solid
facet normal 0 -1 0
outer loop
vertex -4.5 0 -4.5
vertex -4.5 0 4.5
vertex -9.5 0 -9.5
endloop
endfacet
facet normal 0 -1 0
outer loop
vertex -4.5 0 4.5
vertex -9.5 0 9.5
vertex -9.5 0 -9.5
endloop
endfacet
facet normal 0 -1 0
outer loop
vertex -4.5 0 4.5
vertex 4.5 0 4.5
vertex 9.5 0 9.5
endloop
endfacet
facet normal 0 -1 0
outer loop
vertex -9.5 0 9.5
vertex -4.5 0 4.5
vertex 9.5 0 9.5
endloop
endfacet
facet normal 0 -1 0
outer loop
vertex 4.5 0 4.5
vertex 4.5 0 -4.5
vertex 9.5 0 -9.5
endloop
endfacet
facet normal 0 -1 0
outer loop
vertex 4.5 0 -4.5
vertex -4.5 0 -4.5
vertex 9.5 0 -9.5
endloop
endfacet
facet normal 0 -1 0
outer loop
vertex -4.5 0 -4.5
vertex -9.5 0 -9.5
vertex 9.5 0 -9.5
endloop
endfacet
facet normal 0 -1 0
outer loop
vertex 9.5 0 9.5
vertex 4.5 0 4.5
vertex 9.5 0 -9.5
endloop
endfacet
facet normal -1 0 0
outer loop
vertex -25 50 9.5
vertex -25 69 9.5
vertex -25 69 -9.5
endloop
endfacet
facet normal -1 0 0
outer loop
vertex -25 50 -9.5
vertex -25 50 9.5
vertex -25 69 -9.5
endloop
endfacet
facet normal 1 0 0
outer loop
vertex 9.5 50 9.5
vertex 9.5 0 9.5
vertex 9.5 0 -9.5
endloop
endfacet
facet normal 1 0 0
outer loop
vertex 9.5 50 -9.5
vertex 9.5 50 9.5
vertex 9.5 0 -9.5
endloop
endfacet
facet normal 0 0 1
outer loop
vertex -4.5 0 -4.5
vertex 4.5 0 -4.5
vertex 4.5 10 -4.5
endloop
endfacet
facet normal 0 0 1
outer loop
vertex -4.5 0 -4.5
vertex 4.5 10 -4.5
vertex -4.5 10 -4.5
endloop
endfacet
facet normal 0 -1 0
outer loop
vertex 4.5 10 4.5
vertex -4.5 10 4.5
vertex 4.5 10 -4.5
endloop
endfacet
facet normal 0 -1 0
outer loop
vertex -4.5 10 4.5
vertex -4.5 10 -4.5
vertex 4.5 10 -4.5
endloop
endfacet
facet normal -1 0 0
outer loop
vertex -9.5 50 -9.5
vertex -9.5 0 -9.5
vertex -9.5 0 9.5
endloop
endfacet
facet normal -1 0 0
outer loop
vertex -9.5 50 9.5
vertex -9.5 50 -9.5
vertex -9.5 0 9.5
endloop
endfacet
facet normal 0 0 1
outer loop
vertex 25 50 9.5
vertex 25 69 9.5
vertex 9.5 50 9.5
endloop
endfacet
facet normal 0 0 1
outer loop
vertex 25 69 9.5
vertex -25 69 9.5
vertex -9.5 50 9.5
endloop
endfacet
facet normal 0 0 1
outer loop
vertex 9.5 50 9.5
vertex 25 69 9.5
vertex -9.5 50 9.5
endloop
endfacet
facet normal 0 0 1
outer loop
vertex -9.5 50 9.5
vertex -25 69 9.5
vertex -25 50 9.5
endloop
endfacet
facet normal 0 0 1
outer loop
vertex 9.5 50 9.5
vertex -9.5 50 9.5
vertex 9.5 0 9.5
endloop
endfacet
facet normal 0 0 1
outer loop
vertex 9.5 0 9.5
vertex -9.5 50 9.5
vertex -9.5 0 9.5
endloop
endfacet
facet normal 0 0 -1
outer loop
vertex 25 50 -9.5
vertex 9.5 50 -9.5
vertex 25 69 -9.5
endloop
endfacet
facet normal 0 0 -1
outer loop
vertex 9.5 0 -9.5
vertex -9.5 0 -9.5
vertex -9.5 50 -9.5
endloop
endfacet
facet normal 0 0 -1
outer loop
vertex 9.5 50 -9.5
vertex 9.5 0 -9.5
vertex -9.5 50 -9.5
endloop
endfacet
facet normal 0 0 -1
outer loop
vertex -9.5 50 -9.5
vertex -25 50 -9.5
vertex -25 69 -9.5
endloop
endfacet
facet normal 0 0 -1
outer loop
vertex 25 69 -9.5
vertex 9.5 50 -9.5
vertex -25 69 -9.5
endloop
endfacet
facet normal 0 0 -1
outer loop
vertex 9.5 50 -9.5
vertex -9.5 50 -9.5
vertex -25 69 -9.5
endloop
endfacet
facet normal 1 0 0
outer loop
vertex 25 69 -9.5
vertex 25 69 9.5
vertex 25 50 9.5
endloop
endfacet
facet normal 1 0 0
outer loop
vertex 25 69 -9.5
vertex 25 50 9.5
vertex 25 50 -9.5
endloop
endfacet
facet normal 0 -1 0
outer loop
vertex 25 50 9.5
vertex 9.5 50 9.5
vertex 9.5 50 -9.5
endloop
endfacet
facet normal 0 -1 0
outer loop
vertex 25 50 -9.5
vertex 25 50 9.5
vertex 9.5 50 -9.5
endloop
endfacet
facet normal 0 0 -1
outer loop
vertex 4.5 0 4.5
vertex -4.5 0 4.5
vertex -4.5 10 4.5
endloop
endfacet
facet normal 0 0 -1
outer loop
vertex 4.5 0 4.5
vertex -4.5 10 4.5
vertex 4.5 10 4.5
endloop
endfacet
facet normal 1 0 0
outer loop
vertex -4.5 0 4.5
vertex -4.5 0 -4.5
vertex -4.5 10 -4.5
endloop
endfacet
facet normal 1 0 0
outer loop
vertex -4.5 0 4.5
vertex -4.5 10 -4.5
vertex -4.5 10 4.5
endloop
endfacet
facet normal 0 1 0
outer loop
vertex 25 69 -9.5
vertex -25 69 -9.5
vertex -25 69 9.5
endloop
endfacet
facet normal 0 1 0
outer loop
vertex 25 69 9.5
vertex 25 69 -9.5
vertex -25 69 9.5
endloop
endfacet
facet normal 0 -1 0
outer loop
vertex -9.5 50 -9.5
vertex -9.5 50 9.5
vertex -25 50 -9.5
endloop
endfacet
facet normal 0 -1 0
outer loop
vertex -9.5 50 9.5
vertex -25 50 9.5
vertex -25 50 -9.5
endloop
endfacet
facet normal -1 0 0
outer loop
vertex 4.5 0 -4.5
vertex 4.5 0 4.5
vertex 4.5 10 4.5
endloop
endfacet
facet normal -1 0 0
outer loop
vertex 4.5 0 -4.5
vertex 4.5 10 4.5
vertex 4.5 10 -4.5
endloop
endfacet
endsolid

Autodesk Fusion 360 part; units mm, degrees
sketch "Skizze1" plane through (0, 0, 0) normal (0, 1, 0) x (1, 0, 0)
  line L0 (9.5, 9.5) -> (-9.5, 9.5)
  line L1 (-9.5, 9.5) -> (-9.5, -9.5)
  line L2 (-9.5, -9.5) -> (9.5, -9.5)
  line L3 (9.5, -9.5) -> (9.5, 9.5)
  line L4 (9.5, 9.5) -> (-9.5, -9.5) construction
  line L5 (-9.5, 9.5) -> (9.5, -9.5) construction
  line L6 (4.5, 4.5) -> (-4.5, 4.5)
  line L7 (-4.5, 4.5) -> (-4.5, -4.5)
  line L8 (-4.5, -4.5) -> (4.5, -4.5)
  line L9 (4.5, -4.5) -> (4.5, 4.5)
  line L10 (4.5, 4.5) -> (-4.5, -4.5) construction
  line L11 (-4.5, 4.5) -> (4.5, -4.5) construction
  dimension "d1" = 19
  dimension "d2" = 19
  dimension "d3" = 9
  dimension "d4" = 9
extrude "Extrusion1" add sketch "Skizze1" along normal blind 50 contours L0 L1 L2 L3 | L6 L7 L8 L9 makes body 1
ref_plane "Arbeitsebene1" through (0, 25, 0) normal (1, 0, 0) x (0, 0, -1)
sketch "Skizze2" plane through (0, 25, 0) normal (1, 0, 0) x (0, 0, -1)
  line L0 (-9.5, 25) -> (9.5, 25)
  line L1 (9.5, 25) -> (9.5, 44)
  line L2 (9.5, 44) -> (-9.5, 44)
  line L3 (-9.5, 44) -> (-9.5, 25)
  dimension "d8" = 19
  dimension "d9" = 19
extrude "Extrusion2" add sketch "Skizze2" along normal mid plane 50 bodies 1
extrude "Extrusion3" cut sketch "Skizze1" along normal blind 10 contours L6 L7 L8 L9 bodies 1
copy_body "Körper->Berechn1" bodies 1 removing the originals makes body 2 in component "T-Griff"
component "T-Griff" placed x (1, 0, 0) y (0, 1, 0) z (0, 0, 1) at (0, 0, 0)
